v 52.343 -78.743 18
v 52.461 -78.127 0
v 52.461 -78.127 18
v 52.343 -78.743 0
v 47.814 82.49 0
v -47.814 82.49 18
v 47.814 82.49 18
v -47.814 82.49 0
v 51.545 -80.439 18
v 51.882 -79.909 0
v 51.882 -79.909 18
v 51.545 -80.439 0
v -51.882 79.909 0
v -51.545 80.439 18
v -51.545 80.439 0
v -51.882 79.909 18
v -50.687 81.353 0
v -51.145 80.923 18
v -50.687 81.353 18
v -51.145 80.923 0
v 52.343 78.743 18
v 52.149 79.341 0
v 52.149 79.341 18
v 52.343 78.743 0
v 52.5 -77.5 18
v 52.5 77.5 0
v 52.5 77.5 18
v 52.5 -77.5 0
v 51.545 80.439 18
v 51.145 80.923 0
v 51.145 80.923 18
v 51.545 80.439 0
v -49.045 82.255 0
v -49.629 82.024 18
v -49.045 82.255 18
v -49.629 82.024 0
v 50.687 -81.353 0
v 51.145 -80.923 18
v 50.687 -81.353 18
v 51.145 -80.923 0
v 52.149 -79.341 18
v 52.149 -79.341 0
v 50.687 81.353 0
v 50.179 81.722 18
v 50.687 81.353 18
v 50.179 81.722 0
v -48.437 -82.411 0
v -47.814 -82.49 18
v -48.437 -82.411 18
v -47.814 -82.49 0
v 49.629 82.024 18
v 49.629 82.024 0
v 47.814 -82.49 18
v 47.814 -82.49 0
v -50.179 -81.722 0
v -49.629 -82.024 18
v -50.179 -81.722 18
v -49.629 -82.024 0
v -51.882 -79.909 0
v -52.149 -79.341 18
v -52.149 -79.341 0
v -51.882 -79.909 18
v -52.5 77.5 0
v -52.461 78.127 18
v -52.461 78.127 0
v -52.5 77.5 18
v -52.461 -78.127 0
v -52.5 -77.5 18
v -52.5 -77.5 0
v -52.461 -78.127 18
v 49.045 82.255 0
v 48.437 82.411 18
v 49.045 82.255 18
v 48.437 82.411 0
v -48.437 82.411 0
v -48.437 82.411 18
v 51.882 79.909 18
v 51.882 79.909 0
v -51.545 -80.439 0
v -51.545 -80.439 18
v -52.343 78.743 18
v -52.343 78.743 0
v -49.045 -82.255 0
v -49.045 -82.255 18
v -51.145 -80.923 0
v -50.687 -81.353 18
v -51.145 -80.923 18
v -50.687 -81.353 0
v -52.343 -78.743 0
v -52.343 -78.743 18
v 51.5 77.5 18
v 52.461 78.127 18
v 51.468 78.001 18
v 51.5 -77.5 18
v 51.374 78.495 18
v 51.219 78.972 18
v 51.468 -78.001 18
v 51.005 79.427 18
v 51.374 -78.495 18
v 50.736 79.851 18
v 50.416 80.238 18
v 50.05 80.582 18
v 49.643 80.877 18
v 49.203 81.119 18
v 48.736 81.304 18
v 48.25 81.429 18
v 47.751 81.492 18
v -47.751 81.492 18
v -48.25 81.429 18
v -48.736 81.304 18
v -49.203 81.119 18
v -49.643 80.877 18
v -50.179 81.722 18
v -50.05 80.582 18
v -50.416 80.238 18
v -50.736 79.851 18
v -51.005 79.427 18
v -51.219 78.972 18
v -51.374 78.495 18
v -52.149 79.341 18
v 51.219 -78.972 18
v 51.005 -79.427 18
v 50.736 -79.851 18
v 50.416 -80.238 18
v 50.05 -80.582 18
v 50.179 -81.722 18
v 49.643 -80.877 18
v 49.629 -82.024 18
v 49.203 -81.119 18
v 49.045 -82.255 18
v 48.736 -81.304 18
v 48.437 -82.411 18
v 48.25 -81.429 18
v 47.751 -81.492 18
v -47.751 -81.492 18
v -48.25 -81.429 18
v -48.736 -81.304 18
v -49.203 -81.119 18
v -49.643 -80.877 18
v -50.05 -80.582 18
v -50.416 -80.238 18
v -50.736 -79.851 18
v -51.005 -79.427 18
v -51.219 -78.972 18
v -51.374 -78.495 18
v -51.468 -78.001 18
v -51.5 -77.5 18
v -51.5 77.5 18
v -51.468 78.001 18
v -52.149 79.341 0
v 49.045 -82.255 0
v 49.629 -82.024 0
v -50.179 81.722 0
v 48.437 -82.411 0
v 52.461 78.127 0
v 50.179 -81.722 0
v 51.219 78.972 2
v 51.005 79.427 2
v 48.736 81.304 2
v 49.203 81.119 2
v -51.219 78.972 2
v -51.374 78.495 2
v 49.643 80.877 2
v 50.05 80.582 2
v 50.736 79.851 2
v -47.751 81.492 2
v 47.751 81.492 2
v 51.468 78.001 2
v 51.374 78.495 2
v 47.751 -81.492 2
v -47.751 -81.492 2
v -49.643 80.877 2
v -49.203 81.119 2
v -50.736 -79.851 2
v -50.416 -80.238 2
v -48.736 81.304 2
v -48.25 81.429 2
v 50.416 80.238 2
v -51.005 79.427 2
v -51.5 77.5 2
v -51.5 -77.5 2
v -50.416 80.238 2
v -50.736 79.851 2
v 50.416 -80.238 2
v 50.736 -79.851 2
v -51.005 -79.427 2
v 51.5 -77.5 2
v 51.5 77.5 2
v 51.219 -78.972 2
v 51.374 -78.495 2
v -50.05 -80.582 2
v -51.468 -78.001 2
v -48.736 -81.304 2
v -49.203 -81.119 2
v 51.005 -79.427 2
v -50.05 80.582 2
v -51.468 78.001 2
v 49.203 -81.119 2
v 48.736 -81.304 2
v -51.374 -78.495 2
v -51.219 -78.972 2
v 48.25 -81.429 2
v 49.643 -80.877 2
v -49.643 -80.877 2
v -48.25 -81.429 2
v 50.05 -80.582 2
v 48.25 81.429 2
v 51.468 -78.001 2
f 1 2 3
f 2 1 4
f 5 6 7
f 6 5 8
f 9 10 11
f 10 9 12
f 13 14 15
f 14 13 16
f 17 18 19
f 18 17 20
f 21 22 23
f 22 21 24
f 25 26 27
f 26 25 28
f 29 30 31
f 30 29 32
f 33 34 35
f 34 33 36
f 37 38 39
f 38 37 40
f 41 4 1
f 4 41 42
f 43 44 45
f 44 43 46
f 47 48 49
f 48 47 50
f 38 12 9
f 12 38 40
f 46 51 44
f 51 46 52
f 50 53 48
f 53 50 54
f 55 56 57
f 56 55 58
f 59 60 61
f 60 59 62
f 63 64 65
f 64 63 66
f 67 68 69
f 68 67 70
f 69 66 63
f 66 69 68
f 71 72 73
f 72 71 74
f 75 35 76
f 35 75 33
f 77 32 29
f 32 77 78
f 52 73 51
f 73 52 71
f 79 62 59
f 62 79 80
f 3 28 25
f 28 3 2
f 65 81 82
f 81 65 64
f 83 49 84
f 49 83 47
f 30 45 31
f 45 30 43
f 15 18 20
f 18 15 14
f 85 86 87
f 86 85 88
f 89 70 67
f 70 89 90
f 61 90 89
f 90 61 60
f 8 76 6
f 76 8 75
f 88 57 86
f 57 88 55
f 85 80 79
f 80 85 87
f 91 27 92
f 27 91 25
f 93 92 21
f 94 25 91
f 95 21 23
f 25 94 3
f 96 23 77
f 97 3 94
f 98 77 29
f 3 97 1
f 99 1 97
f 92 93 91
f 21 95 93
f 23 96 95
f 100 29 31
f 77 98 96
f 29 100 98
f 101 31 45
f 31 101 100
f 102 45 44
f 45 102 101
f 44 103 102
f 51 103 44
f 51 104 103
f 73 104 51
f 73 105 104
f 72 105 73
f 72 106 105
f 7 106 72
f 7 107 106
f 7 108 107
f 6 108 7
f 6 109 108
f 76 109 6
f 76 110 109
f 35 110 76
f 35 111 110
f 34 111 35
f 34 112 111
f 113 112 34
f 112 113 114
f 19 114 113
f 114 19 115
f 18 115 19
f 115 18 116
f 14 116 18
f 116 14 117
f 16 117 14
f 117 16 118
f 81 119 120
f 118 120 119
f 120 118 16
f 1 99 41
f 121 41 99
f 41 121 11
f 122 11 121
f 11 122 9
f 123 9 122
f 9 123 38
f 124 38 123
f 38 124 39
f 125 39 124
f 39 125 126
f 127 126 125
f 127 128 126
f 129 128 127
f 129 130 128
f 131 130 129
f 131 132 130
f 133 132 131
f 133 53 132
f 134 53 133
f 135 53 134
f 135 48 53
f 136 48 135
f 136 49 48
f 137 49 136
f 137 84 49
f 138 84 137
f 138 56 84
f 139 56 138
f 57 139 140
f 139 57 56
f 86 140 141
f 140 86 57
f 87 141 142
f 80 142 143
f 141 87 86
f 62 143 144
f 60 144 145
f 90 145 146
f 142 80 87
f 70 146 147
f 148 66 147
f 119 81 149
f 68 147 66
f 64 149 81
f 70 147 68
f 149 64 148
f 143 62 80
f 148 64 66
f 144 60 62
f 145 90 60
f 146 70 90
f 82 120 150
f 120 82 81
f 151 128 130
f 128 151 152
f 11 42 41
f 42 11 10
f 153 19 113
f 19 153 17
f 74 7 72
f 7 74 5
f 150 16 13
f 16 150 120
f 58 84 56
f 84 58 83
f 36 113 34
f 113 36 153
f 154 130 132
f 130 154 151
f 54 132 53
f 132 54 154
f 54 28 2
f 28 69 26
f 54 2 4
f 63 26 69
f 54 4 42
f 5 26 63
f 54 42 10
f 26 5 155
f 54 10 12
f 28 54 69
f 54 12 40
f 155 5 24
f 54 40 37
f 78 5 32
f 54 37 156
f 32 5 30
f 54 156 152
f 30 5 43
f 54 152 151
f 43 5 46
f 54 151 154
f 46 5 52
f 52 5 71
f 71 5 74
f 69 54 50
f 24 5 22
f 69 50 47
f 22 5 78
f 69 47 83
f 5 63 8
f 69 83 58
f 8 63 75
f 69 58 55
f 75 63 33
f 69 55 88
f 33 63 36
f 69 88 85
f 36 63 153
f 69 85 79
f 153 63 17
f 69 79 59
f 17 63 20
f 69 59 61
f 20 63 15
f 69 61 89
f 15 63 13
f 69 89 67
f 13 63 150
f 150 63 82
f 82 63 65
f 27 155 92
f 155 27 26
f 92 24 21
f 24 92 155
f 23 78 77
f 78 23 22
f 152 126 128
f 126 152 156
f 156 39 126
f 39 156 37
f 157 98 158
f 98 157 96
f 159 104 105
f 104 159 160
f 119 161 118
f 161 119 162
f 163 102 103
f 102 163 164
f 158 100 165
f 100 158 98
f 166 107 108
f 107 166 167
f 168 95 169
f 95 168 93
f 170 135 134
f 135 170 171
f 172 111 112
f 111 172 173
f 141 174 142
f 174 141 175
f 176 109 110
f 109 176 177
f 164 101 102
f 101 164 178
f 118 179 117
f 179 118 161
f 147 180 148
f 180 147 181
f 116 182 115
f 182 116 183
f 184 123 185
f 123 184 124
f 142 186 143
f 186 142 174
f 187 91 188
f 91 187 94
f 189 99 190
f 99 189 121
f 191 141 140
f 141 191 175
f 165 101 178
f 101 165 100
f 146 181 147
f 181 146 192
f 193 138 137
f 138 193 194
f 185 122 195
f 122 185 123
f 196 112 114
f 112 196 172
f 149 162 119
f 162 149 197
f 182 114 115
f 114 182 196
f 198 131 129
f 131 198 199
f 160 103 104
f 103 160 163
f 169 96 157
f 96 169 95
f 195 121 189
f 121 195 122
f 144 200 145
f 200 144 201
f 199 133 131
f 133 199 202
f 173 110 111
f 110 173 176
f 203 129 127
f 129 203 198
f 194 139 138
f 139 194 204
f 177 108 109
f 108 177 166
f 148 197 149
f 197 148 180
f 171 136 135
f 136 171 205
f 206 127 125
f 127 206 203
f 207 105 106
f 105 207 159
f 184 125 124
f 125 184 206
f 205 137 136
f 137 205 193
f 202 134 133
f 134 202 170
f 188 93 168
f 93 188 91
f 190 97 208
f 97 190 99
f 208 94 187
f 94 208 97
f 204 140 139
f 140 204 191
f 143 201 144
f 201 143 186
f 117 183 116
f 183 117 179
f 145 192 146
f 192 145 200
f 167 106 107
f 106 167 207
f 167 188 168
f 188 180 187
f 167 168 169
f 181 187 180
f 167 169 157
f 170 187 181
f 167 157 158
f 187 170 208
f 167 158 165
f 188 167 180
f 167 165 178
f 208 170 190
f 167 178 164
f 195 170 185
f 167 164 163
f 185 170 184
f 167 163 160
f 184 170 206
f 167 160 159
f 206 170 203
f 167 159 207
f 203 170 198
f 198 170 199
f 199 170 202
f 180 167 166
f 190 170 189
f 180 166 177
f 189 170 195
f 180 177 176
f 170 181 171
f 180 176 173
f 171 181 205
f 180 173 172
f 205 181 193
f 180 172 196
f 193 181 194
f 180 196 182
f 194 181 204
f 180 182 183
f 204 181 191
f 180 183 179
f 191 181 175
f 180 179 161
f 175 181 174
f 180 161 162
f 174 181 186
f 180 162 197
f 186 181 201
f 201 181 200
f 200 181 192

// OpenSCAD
$fn = 50;


difference() {
	union() {
		hull() {
			translate(v = [-47.5000000000, 77.5000000000, 0]) {
				cylinder(h = 18, r = 5);
			}
			translate(v = [47.5000000000, 77.5000000000, 0]) {
				cylinder(h = 18, r = 5);
			}
			translate(v = [-47.5000000000, -77.5000000000, 0]) {
				cylinder(h = 18, r = 5);
			}
			translate(v = [47.5000000000, -77.5000000000, 0]) {
				cylinder(h = 18, r = 5);
			}
		}
	}
	union() {
		translate(v = [0, 0, 2]) {
			hull() {
				translate(v = [-47.5000000000, 77.5000000000, 0]) {
					cylinder(h = 16, r = 4);
				}
				translate(v = [47.5000000000, 77.5000000000, 0]) {
					cylinder(h = 16, r = 4);
				}
				translate(v = [-47.5000000000, -77.5000000000, 0]) {
					cylinder(h = 16, r = 4);
				}
				translate(v = [47.5000000000, -77.5000000000, 0]) {
					cylinder(h = 16, r = 4);
				}
			}
		}
	}
}
